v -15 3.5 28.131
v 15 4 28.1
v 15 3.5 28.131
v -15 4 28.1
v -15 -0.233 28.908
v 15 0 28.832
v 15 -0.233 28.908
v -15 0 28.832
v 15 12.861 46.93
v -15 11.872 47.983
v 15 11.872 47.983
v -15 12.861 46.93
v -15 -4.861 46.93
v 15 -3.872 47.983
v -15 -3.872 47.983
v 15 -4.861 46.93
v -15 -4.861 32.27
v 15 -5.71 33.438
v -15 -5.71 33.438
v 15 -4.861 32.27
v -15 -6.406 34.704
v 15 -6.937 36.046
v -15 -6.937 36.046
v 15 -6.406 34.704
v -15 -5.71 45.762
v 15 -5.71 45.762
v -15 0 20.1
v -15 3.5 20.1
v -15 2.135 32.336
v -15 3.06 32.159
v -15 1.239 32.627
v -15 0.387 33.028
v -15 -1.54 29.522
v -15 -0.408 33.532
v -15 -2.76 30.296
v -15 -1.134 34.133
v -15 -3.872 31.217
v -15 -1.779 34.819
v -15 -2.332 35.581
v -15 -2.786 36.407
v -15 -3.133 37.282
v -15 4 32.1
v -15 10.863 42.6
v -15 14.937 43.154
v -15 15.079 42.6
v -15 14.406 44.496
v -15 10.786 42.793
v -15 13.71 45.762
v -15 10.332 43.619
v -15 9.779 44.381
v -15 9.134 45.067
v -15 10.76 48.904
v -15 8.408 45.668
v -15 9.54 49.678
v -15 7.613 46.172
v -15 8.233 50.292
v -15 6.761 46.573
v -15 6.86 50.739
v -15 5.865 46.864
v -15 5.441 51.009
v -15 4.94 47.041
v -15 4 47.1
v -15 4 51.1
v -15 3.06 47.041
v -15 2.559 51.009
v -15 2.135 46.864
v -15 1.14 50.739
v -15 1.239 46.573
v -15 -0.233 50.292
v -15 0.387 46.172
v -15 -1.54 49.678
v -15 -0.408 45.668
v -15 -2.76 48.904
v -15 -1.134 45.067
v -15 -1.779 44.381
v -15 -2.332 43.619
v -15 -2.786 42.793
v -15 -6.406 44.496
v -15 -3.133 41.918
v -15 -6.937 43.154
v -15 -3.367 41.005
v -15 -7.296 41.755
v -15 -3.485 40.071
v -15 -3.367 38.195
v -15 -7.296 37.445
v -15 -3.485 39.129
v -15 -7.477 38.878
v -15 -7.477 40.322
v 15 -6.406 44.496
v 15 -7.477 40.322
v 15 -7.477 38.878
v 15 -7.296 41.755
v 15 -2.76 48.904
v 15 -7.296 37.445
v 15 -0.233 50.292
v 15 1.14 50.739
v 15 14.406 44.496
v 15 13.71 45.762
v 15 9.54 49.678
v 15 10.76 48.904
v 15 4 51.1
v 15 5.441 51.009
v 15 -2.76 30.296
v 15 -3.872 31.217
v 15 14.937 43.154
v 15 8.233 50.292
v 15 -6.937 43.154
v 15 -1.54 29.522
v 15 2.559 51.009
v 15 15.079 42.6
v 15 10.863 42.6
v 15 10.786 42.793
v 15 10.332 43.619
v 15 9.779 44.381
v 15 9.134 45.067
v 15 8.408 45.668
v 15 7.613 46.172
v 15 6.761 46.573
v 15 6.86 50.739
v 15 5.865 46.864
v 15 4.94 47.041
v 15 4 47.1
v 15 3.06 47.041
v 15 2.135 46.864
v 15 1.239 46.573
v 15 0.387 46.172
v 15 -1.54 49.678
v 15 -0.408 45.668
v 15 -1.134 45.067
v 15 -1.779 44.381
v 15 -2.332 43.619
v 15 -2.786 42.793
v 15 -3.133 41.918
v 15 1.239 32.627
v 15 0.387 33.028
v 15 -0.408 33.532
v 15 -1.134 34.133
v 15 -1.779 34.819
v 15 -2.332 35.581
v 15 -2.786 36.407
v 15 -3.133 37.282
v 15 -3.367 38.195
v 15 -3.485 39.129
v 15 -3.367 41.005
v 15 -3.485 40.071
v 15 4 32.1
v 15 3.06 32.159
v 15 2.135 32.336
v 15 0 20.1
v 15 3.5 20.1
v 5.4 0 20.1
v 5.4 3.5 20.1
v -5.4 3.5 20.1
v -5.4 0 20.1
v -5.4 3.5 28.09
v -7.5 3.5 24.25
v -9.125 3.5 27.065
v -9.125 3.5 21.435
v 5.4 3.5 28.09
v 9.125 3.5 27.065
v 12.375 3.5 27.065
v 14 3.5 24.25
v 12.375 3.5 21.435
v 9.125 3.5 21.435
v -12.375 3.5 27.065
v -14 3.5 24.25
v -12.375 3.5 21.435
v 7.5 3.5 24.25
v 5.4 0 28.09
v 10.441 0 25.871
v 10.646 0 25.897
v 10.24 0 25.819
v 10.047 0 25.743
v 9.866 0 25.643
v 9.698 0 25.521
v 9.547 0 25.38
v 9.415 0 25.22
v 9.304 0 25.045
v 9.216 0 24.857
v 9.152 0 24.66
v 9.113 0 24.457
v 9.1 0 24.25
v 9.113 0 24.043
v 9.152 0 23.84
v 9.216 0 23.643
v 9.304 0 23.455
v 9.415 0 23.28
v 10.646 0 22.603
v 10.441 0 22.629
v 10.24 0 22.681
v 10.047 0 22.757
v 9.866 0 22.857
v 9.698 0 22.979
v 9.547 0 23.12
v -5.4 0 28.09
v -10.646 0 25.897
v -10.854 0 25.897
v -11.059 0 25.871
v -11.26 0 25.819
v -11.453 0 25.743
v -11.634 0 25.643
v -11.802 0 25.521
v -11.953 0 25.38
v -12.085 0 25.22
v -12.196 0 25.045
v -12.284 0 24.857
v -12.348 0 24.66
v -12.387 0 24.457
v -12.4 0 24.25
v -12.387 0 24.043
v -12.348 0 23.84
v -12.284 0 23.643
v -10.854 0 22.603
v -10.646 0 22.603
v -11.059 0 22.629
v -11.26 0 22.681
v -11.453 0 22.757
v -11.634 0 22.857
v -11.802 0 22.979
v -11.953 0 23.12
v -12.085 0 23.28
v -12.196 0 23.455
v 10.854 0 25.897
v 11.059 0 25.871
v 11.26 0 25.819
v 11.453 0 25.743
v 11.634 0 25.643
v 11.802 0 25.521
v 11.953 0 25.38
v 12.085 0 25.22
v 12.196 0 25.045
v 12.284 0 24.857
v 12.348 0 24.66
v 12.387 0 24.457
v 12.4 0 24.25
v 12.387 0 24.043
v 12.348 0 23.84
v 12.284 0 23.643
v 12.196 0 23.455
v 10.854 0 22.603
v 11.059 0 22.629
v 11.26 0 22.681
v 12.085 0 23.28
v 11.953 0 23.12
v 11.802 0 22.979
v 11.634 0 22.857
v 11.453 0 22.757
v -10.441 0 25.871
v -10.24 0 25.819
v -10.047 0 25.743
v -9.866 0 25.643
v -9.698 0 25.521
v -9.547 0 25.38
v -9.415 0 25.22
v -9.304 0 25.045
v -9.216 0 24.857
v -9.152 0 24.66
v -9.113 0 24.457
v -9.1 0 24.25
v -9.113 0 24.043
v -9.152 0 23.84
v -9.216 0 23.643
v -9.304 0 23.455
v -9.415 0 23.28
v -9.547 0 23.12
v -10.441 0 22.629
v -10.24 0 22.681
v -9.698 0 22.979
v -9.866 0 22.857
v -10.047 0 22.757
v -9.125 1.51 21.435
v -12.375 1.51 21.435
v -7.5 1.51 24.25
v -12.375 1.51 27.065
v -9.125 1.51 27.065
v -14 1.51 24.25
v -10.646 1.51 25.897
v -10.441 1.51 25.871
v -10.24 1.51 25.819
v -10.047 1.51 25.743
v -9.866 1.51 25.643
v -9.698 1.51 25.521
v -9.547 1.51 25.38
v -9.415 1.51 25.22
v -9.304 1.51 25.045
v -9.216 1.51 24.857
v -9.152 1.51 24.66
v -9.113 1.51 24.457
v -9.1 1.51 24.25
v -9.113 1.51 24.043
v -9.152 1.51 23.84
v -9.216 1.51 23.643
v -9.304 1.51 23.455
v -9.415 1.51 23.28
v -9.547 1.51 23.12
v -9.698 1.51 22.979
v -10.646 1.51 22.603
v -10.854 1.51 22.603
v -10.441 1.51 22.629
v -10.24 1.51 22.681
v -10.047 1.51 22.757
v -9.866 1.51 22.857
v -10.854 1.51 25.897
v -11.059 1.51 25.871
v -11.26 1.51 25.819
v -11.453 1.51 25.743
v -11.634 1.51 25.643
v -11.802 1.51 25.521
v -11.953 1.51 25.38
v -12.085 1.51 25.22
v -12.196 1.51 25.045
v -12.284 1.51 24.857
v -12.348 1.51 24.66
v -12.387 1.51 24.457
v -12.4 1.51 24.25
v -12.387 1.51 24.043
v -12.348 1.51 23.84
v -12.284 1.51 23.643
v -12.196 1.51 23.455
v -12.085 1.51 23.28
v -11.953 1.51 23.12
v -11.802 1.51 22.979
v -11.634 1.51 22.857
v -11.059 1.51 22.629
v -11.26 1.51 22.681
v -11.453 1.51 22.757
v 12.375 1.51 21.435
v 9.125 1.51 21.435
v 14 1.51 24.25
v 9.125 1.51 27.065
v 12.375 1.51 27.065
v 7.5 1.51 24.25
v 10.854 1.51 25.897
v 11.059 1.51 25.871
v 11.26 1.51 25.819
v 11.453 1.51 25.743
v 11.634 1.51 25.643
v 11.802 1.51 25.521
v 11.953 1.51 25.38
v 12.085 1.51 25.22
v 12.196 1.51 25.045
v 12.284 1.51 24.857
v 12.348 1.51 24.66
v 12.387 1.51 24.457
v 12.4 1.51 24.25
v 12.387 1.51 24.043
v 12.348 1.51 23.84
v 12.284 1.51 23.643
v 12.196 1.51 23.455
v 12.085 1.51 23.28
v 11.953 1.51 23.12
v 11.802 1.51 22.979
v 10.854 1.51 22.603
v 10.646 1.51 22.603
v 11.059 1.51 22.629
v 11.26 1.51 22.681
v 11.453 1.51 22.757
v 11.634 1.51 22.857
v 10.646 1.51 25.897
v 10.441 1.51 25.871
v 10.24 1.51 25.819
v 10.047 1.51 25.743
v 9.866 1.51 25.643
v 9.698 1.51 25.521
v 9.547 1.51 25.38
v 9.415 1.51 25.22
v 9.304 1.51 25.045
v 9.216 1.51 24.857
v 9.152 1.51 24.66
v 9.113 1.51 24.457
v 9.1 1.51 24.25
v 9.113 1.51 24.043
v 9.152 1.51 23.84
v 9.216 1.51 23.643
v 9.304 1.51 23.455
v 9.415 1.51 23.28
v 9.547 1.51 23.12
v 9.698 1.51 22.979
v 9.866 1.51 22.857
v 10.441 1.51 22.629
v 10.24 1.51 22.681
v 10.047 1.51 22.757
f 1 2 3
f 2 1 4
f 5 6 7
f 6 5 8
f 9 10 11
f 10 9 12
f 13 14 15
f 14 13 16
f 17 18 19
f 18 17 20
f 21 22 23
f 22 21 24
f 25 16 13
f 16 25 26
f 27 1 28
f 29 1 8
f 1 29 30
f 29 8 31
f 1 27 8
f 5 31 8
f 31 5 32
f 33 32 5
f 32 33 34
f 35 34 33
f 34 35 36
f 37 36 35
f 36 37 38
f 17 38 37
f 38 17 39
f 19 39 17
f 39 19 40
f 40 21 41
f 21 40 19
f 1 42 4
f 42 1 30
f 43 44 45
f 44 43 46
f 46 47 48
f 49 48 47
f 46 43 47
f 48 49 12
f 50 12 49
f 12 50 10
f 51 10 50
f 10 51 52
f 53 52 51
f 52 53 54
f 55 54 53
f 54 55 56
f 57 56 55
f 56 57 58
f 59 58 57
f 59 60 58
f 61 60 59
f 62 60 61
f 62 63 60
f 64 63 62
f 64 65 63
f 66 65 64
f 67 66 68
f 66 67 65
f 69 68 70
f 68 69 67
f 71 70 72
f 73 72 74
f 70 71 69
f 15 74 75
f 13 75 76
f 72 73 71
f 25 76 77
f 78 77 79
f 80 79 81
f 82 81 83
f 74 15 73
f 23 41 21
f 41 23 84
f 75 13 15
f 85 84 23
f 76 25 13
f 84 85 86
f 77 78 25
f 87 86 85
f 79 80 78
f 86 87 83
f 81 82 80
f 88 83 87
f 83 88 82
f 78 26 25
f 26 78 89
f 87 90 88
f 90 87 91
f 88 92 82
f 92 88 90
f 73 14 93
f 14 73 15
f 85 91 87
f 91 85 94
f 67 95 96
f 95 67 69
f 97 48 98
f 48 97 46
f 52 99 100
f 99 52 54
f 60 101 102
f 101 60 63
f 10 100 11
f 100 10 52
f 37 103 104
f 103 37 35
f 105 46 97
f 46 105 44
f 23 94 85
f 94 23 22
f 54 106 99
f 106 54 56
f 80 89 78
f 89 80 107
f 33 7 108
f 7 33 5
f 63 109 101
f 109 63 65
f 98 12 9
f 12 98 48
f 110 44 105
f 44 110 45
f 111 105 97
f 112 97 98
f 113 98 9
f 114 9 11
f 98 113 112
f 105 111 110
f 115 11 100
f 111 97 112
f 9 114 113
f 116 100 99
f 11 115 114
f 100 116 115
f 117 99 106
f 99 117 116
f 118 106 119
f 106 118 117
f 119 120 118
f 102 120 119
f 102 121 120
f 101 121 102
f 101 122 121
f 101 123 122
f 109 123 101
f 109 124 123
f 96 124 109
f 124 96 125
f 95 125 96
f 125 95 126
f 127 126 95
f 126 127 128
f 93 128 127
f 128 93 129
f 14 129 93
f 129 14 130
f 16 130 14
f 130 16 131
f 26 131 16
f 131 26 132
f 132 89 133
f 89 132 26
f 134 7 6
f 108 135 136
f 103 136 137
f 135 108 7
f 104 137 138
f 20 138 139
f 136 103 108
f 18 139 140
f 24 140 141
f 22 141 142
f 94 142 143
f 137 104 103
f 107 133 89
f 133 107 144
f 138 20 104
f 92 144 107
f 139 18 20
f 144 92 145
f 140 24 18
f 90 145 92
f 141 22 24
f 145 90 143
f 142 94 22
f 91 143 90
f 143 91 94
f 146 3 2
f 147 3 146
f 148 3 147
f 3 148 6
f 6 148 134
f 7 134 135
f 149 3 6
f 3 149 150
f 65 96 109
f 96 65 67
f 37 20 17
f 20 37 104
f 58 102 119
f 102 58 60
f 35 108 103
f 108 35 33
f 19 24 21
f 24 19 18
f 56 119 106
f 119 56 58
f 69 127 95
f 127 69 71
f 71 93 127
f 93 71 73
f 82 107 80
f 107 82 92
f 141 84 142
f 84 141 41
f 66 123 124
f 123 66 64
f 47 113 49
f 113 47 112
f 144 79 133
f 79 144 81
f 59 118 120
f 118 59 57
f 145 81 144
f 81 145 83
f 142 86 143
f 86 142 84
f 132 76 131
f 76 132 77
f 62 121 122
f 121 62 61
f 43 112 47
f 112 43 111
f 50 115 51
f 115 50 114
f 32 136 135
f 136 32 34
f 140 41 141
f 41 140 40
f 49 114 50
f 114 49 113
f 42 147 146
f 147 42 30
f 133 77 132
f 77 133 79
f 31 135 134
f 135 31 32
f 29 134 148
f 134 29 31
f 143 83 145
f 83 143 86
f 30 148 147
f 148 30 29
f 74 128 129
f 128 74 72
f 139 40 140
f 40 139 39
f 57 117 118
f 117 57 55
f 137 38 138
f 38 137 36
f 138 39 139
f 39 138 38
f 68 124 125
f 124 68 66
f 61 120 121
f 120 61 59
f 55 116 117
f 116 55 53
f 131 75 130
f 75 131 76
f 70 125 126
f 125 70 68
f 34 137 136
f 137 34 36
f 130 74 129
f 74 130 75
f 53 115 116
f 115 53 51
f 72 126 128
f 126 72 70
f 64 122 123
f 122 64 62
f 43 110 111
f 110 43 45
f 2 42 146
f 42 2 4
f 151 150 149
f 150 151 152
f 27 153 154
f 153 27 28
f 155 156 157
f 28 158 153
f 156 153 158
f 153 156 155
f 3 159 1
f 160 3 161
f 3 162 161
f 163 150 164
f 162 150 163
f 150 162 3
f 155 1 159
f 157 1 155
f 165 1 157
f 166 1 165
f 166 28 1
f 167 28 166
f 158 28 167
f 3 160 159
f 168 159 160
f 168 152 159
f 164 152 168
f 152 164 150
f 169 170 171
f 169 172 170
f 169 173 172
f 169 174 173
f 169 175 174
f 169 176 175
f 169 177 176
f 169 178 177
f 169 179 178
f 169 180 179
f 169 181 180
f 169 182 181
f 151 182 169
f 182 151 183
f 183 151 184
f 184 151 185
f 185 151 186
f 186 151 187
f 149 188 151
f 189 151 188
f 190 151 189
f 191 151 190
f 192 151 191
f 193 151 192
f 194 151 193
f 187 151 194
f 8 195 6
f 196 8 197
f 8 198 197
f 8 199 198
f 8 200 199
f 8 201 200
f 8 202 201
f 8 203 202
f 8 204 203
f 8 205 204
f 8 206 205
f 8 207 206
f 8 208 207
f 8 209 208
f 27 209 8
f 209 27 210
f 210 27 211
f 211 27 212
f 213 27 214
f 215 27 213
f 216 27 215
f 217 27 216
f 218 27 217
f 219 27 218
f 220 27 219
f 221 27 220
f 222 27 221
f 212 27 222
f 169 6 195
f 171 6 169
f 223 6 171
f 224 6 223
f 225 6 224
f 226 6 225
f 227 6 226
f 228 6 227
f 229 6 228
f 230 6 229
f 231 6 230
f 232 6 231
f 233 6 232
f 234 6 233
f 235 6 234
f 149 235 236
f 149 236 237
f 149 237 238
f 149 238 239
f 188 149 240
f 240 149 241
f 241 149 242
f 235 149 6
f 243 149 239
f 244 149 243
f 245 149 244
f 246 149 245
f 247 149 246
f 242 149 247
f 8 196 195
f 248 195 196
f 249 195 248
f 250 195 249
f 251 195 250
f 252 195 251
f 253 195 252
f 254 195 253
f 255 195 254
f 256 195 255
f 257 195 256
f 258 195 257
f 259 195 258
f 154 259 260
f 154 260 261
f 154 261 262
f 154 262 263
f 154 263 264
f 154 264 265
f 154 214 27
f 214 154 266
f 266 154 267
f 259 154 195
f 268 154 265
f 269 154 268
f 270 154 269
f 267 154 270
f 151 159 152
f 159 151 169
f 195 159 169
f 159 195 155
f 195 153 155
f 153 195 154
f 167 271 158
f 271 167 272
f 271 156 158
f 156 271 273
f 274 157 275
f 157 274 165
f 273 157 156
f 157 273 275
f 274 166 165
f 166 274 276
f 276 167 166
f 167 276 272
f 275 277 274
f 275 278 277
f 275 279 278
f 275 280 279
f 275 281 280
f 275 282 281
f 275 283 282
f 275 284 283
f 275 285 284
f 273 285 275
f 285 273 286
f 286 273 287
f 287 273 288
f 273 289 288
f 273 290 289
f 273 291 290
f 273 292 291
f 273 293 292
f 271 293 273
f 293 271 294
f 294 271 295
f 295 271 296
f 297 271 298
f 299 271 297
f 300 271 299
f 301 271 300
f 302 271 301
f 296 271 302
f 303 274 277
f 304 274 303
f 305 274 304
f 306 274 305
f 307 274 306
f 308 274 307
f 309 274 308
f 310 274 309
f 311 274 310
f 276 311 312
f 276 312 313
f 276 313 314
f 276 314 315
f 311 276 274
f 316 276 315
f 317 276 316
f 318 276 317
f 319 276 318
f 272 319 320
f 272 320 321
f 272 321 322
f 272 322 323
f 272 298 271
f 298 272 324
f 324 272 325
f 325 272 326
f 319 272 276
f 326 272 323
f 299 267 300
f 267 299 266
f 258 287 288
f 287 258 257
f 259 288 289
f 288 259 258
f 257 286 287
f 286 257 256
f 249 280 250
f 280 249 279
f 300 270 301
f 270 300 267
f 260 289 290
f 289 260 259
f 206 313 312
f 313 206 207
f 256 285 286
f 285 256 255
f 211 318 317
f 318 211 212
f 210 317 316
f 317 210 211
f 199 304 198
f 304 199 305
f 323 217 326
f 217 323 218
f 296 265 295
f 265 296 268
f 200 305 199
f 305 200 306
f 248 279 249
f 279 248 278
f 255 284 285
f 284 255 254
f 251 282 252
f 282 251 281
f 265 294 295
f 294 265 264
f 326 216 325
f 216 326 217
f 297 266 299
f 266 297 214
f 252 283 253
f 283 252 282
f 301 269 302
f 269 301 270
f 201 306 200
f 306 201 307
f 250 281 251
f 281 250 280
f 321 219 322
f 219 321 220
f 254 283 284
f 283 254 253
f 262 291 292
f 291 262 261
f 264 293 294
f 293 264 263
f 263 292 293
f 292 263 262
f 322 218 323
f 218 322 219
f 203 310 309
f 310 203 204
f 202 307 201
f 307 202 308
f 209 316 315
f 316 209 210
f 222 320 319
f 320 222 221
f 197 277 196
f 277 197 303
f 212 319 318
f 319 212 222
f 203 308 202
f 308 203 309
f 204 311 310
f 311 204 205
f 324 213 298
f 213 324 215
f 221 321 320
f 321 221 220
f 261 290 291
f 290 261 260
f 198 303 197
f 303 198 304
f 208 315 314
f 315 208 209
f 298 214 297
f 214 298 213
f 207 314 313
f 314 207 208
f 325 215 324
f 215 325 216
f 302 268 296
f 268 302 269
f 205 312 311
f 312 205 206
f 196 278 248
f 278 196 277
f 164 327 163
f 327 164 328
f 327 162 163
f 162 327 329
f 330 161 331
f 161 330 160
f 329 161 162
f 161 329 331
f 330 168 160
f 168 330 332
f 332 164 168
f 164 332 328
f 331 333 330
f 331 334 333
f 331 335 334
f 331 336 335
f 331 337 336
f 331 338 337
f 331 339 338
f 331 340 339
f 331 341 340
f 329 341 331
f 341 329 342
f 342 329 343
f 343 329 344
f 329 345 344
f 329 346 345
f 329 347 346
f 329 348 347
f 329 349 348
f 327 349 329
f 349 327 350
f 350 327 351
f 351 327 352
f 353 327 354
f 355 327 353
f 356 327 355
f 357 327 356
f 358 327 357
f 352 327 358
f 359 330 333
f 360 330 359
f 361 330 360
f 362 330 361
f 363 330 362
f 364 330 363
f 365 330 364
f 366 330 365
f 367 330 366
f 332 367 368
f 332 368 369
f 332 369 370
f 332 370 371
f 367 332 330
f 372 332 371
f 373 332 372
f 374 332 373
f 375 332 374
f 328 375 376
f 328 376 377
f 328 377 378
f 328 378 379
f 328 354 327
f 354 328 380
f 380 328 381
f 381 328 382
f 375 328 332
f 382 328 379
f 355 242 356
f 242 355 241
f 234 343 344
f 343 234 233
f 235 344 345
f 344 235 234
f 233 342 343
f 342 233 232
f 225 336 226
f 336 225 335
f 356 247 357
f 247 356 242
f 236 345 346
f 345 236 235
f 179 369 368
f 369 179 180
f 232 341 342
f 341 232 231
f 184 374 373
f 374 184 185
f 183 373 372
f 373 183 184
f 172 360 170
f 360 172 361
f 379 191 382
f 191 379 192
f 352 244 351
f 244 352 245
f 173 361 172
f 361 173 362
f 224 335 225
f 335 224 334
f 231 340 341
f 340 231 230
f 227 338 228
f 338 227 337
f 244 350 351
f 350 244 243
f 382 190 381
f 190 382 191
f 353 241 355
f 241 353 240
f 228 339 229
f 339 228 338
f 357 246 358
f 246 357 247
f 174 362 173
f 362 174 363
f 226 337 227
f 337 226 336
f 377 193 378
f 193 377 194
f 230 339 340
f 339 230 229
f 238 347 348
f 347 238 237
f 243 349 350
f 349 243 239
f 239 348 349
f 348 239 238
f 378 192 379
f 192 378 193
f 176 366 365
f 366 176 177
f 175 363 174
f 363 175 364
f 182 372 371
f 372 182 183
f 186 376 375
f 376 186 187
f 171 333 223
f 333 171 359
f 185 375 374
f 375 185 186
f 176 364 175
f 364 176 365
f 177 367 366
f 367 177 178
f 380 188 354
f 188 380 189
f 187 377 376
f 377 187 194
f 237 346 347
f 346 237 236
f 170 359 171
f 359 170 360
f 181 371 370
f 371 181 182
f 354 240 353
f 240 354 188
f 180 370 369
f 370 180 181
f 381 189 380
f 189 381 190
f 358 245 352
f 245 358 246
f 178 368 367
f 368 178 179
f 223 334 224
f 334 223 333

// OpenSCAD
$fn=50;

DELTA=0.01;

PRINT_HOOK=1;
PRINT_BODY=0;
PRINT_BODY1=1;

WIRED=5.4;
HOOKH=20;

BARD=15;
BARLEN=30;

BLOCKH=8;

BARR=BARD/2;
WIRER=WIRED/2;
THICK=2;

BOLTSPACE=8;

module down(x)
{
    translate([0,0,-x]) children();
}

BLOCKTHICK=7;

M3nutDia=6.5;
M3boltDia=3.3;
M3nutHeight=2;

module bolt_hole()
{
    XXX=30;
    cylinder(d=M3nutDia,h=M3nutHeight,center=false, $fn=6);
    translate([0,0,M3nutHeight-DELTA]) cylinder(d=M3boltDia,h=XXX,center=false);
}

module hook2()
{
    rotate([0,90,0]) translate([0,0,-BARLEN/2]) difference()
    {
        cylinder(r=BARR+THICK*2, h=BARLEN);
        down(DELTA) cylinder(r=BARR, h=BARLEN+DELTA*2);
        translate([-3,0,0]) down(DELTA) cube([BARD, BARD, BARLEN+DELTA*2]);
    }
    translate([-BARLEN/2,-THICK*2,-(BARR+THICK*2+BLOCKH)]) difference()
    {
        cube([BARLEN,BLOCKTHICK/2,BLOCKH+THICK*2]);
        translate([(BARLEN-WIRED*2)/2,-DELTA,-DELTA]) cube([WIRED*2,DELTA*2+BLOCKTHICK/2,BLOCKH]);
    }
}

BOLTSPREAD=2;
module hook()
{
    outer = WIRER+THICK*2;
    blockx=outer*2+BOLTSPACE*2;
    difference()
    {
        union()
        {
            cylinder(r=outer,h=HOOKH);
            translate([-blockx/2, -BLOCKTHICK/2,0]) cube([blockx,BLOCKTHICK,HOOKH]);
            translate([-blockx/2, -BLOCKTHICK/2,0])cube([BOLTSPACE,BLOCKTHICK/2,HOOKH+8]);
            translate([+blockx/2-BOLTSPACE, -BLOCKTHICK/2,0])cube([BOLTSPACE,BLOCKTHICK/2,HOOKH+8]);
        }
        down(DELTA)cylinder(r=WIRER,h=HOOKH+DELTA*2);
        translate([-blockx/2+M3nutDia/2+1,BLOCKTHICK/2+DELTA,M3nutDia/2+BOLTSPREAD]) rotate([90,0,0])bolt_hole();
        translate([-blockx/2+M3nutDia/2+1,BLOCKTHICK/2+DELTA,HOOKH-(M3nutDia/2+BOLTSPREAD)]) rotate([90,0,0])bolt_hole();
        translate([blockx/2-M3nutDia/2-1,BLOCKTHICK/2+DELTA,M3nutDia/2+BOLTSPREAD]) rotate([90,0,0])bolt_hole();
        translate([blockx/2-M3nutDia/2-1,BLOCKTHICK/2+DELTA,HOOKH-(M3nutDia/2+BOLTSPREAD)]) rotate([90,0,0])bolt_hole();

        if(PRINT_BODY1)
        {
            translate([-blockx/2-DELTA,0,-DELTA]) cube([blockx+DELTA*2, BLOCKTHICK, HOOKH+DELTA*2]);
        } else {
            translate([-blockx/2-DELTA,DELTA-BLOCKTHICK,-DELTA]) cube([blockx+DELTA*2, BLOCKTHICK, HOOKH+DELTA*2+10]);
        }
    }
}

difference()
{
    union()
    {
        if(PRINT_BODY)
        {
            hook();
        }
        if(PRINT_HOOK)
        {
            translate([0,4,4.6+HOOKH+BARD]) hook2();
        }
    }
    translate([-BARLEN/2+M3nutDia/2+1,BLOCKTHICK/2+DELTA,HOOKH+(M3nutDia/2+1)]) rotate([90,0,0])bolt_hole();
    translate([BARLEN/2-M3nutDia/2-1,BLOCKTHICK/2+DELTA,HOOKH+(M3nutDia/2+1)]) rotate([90,0,0])bolt_hole();
}
